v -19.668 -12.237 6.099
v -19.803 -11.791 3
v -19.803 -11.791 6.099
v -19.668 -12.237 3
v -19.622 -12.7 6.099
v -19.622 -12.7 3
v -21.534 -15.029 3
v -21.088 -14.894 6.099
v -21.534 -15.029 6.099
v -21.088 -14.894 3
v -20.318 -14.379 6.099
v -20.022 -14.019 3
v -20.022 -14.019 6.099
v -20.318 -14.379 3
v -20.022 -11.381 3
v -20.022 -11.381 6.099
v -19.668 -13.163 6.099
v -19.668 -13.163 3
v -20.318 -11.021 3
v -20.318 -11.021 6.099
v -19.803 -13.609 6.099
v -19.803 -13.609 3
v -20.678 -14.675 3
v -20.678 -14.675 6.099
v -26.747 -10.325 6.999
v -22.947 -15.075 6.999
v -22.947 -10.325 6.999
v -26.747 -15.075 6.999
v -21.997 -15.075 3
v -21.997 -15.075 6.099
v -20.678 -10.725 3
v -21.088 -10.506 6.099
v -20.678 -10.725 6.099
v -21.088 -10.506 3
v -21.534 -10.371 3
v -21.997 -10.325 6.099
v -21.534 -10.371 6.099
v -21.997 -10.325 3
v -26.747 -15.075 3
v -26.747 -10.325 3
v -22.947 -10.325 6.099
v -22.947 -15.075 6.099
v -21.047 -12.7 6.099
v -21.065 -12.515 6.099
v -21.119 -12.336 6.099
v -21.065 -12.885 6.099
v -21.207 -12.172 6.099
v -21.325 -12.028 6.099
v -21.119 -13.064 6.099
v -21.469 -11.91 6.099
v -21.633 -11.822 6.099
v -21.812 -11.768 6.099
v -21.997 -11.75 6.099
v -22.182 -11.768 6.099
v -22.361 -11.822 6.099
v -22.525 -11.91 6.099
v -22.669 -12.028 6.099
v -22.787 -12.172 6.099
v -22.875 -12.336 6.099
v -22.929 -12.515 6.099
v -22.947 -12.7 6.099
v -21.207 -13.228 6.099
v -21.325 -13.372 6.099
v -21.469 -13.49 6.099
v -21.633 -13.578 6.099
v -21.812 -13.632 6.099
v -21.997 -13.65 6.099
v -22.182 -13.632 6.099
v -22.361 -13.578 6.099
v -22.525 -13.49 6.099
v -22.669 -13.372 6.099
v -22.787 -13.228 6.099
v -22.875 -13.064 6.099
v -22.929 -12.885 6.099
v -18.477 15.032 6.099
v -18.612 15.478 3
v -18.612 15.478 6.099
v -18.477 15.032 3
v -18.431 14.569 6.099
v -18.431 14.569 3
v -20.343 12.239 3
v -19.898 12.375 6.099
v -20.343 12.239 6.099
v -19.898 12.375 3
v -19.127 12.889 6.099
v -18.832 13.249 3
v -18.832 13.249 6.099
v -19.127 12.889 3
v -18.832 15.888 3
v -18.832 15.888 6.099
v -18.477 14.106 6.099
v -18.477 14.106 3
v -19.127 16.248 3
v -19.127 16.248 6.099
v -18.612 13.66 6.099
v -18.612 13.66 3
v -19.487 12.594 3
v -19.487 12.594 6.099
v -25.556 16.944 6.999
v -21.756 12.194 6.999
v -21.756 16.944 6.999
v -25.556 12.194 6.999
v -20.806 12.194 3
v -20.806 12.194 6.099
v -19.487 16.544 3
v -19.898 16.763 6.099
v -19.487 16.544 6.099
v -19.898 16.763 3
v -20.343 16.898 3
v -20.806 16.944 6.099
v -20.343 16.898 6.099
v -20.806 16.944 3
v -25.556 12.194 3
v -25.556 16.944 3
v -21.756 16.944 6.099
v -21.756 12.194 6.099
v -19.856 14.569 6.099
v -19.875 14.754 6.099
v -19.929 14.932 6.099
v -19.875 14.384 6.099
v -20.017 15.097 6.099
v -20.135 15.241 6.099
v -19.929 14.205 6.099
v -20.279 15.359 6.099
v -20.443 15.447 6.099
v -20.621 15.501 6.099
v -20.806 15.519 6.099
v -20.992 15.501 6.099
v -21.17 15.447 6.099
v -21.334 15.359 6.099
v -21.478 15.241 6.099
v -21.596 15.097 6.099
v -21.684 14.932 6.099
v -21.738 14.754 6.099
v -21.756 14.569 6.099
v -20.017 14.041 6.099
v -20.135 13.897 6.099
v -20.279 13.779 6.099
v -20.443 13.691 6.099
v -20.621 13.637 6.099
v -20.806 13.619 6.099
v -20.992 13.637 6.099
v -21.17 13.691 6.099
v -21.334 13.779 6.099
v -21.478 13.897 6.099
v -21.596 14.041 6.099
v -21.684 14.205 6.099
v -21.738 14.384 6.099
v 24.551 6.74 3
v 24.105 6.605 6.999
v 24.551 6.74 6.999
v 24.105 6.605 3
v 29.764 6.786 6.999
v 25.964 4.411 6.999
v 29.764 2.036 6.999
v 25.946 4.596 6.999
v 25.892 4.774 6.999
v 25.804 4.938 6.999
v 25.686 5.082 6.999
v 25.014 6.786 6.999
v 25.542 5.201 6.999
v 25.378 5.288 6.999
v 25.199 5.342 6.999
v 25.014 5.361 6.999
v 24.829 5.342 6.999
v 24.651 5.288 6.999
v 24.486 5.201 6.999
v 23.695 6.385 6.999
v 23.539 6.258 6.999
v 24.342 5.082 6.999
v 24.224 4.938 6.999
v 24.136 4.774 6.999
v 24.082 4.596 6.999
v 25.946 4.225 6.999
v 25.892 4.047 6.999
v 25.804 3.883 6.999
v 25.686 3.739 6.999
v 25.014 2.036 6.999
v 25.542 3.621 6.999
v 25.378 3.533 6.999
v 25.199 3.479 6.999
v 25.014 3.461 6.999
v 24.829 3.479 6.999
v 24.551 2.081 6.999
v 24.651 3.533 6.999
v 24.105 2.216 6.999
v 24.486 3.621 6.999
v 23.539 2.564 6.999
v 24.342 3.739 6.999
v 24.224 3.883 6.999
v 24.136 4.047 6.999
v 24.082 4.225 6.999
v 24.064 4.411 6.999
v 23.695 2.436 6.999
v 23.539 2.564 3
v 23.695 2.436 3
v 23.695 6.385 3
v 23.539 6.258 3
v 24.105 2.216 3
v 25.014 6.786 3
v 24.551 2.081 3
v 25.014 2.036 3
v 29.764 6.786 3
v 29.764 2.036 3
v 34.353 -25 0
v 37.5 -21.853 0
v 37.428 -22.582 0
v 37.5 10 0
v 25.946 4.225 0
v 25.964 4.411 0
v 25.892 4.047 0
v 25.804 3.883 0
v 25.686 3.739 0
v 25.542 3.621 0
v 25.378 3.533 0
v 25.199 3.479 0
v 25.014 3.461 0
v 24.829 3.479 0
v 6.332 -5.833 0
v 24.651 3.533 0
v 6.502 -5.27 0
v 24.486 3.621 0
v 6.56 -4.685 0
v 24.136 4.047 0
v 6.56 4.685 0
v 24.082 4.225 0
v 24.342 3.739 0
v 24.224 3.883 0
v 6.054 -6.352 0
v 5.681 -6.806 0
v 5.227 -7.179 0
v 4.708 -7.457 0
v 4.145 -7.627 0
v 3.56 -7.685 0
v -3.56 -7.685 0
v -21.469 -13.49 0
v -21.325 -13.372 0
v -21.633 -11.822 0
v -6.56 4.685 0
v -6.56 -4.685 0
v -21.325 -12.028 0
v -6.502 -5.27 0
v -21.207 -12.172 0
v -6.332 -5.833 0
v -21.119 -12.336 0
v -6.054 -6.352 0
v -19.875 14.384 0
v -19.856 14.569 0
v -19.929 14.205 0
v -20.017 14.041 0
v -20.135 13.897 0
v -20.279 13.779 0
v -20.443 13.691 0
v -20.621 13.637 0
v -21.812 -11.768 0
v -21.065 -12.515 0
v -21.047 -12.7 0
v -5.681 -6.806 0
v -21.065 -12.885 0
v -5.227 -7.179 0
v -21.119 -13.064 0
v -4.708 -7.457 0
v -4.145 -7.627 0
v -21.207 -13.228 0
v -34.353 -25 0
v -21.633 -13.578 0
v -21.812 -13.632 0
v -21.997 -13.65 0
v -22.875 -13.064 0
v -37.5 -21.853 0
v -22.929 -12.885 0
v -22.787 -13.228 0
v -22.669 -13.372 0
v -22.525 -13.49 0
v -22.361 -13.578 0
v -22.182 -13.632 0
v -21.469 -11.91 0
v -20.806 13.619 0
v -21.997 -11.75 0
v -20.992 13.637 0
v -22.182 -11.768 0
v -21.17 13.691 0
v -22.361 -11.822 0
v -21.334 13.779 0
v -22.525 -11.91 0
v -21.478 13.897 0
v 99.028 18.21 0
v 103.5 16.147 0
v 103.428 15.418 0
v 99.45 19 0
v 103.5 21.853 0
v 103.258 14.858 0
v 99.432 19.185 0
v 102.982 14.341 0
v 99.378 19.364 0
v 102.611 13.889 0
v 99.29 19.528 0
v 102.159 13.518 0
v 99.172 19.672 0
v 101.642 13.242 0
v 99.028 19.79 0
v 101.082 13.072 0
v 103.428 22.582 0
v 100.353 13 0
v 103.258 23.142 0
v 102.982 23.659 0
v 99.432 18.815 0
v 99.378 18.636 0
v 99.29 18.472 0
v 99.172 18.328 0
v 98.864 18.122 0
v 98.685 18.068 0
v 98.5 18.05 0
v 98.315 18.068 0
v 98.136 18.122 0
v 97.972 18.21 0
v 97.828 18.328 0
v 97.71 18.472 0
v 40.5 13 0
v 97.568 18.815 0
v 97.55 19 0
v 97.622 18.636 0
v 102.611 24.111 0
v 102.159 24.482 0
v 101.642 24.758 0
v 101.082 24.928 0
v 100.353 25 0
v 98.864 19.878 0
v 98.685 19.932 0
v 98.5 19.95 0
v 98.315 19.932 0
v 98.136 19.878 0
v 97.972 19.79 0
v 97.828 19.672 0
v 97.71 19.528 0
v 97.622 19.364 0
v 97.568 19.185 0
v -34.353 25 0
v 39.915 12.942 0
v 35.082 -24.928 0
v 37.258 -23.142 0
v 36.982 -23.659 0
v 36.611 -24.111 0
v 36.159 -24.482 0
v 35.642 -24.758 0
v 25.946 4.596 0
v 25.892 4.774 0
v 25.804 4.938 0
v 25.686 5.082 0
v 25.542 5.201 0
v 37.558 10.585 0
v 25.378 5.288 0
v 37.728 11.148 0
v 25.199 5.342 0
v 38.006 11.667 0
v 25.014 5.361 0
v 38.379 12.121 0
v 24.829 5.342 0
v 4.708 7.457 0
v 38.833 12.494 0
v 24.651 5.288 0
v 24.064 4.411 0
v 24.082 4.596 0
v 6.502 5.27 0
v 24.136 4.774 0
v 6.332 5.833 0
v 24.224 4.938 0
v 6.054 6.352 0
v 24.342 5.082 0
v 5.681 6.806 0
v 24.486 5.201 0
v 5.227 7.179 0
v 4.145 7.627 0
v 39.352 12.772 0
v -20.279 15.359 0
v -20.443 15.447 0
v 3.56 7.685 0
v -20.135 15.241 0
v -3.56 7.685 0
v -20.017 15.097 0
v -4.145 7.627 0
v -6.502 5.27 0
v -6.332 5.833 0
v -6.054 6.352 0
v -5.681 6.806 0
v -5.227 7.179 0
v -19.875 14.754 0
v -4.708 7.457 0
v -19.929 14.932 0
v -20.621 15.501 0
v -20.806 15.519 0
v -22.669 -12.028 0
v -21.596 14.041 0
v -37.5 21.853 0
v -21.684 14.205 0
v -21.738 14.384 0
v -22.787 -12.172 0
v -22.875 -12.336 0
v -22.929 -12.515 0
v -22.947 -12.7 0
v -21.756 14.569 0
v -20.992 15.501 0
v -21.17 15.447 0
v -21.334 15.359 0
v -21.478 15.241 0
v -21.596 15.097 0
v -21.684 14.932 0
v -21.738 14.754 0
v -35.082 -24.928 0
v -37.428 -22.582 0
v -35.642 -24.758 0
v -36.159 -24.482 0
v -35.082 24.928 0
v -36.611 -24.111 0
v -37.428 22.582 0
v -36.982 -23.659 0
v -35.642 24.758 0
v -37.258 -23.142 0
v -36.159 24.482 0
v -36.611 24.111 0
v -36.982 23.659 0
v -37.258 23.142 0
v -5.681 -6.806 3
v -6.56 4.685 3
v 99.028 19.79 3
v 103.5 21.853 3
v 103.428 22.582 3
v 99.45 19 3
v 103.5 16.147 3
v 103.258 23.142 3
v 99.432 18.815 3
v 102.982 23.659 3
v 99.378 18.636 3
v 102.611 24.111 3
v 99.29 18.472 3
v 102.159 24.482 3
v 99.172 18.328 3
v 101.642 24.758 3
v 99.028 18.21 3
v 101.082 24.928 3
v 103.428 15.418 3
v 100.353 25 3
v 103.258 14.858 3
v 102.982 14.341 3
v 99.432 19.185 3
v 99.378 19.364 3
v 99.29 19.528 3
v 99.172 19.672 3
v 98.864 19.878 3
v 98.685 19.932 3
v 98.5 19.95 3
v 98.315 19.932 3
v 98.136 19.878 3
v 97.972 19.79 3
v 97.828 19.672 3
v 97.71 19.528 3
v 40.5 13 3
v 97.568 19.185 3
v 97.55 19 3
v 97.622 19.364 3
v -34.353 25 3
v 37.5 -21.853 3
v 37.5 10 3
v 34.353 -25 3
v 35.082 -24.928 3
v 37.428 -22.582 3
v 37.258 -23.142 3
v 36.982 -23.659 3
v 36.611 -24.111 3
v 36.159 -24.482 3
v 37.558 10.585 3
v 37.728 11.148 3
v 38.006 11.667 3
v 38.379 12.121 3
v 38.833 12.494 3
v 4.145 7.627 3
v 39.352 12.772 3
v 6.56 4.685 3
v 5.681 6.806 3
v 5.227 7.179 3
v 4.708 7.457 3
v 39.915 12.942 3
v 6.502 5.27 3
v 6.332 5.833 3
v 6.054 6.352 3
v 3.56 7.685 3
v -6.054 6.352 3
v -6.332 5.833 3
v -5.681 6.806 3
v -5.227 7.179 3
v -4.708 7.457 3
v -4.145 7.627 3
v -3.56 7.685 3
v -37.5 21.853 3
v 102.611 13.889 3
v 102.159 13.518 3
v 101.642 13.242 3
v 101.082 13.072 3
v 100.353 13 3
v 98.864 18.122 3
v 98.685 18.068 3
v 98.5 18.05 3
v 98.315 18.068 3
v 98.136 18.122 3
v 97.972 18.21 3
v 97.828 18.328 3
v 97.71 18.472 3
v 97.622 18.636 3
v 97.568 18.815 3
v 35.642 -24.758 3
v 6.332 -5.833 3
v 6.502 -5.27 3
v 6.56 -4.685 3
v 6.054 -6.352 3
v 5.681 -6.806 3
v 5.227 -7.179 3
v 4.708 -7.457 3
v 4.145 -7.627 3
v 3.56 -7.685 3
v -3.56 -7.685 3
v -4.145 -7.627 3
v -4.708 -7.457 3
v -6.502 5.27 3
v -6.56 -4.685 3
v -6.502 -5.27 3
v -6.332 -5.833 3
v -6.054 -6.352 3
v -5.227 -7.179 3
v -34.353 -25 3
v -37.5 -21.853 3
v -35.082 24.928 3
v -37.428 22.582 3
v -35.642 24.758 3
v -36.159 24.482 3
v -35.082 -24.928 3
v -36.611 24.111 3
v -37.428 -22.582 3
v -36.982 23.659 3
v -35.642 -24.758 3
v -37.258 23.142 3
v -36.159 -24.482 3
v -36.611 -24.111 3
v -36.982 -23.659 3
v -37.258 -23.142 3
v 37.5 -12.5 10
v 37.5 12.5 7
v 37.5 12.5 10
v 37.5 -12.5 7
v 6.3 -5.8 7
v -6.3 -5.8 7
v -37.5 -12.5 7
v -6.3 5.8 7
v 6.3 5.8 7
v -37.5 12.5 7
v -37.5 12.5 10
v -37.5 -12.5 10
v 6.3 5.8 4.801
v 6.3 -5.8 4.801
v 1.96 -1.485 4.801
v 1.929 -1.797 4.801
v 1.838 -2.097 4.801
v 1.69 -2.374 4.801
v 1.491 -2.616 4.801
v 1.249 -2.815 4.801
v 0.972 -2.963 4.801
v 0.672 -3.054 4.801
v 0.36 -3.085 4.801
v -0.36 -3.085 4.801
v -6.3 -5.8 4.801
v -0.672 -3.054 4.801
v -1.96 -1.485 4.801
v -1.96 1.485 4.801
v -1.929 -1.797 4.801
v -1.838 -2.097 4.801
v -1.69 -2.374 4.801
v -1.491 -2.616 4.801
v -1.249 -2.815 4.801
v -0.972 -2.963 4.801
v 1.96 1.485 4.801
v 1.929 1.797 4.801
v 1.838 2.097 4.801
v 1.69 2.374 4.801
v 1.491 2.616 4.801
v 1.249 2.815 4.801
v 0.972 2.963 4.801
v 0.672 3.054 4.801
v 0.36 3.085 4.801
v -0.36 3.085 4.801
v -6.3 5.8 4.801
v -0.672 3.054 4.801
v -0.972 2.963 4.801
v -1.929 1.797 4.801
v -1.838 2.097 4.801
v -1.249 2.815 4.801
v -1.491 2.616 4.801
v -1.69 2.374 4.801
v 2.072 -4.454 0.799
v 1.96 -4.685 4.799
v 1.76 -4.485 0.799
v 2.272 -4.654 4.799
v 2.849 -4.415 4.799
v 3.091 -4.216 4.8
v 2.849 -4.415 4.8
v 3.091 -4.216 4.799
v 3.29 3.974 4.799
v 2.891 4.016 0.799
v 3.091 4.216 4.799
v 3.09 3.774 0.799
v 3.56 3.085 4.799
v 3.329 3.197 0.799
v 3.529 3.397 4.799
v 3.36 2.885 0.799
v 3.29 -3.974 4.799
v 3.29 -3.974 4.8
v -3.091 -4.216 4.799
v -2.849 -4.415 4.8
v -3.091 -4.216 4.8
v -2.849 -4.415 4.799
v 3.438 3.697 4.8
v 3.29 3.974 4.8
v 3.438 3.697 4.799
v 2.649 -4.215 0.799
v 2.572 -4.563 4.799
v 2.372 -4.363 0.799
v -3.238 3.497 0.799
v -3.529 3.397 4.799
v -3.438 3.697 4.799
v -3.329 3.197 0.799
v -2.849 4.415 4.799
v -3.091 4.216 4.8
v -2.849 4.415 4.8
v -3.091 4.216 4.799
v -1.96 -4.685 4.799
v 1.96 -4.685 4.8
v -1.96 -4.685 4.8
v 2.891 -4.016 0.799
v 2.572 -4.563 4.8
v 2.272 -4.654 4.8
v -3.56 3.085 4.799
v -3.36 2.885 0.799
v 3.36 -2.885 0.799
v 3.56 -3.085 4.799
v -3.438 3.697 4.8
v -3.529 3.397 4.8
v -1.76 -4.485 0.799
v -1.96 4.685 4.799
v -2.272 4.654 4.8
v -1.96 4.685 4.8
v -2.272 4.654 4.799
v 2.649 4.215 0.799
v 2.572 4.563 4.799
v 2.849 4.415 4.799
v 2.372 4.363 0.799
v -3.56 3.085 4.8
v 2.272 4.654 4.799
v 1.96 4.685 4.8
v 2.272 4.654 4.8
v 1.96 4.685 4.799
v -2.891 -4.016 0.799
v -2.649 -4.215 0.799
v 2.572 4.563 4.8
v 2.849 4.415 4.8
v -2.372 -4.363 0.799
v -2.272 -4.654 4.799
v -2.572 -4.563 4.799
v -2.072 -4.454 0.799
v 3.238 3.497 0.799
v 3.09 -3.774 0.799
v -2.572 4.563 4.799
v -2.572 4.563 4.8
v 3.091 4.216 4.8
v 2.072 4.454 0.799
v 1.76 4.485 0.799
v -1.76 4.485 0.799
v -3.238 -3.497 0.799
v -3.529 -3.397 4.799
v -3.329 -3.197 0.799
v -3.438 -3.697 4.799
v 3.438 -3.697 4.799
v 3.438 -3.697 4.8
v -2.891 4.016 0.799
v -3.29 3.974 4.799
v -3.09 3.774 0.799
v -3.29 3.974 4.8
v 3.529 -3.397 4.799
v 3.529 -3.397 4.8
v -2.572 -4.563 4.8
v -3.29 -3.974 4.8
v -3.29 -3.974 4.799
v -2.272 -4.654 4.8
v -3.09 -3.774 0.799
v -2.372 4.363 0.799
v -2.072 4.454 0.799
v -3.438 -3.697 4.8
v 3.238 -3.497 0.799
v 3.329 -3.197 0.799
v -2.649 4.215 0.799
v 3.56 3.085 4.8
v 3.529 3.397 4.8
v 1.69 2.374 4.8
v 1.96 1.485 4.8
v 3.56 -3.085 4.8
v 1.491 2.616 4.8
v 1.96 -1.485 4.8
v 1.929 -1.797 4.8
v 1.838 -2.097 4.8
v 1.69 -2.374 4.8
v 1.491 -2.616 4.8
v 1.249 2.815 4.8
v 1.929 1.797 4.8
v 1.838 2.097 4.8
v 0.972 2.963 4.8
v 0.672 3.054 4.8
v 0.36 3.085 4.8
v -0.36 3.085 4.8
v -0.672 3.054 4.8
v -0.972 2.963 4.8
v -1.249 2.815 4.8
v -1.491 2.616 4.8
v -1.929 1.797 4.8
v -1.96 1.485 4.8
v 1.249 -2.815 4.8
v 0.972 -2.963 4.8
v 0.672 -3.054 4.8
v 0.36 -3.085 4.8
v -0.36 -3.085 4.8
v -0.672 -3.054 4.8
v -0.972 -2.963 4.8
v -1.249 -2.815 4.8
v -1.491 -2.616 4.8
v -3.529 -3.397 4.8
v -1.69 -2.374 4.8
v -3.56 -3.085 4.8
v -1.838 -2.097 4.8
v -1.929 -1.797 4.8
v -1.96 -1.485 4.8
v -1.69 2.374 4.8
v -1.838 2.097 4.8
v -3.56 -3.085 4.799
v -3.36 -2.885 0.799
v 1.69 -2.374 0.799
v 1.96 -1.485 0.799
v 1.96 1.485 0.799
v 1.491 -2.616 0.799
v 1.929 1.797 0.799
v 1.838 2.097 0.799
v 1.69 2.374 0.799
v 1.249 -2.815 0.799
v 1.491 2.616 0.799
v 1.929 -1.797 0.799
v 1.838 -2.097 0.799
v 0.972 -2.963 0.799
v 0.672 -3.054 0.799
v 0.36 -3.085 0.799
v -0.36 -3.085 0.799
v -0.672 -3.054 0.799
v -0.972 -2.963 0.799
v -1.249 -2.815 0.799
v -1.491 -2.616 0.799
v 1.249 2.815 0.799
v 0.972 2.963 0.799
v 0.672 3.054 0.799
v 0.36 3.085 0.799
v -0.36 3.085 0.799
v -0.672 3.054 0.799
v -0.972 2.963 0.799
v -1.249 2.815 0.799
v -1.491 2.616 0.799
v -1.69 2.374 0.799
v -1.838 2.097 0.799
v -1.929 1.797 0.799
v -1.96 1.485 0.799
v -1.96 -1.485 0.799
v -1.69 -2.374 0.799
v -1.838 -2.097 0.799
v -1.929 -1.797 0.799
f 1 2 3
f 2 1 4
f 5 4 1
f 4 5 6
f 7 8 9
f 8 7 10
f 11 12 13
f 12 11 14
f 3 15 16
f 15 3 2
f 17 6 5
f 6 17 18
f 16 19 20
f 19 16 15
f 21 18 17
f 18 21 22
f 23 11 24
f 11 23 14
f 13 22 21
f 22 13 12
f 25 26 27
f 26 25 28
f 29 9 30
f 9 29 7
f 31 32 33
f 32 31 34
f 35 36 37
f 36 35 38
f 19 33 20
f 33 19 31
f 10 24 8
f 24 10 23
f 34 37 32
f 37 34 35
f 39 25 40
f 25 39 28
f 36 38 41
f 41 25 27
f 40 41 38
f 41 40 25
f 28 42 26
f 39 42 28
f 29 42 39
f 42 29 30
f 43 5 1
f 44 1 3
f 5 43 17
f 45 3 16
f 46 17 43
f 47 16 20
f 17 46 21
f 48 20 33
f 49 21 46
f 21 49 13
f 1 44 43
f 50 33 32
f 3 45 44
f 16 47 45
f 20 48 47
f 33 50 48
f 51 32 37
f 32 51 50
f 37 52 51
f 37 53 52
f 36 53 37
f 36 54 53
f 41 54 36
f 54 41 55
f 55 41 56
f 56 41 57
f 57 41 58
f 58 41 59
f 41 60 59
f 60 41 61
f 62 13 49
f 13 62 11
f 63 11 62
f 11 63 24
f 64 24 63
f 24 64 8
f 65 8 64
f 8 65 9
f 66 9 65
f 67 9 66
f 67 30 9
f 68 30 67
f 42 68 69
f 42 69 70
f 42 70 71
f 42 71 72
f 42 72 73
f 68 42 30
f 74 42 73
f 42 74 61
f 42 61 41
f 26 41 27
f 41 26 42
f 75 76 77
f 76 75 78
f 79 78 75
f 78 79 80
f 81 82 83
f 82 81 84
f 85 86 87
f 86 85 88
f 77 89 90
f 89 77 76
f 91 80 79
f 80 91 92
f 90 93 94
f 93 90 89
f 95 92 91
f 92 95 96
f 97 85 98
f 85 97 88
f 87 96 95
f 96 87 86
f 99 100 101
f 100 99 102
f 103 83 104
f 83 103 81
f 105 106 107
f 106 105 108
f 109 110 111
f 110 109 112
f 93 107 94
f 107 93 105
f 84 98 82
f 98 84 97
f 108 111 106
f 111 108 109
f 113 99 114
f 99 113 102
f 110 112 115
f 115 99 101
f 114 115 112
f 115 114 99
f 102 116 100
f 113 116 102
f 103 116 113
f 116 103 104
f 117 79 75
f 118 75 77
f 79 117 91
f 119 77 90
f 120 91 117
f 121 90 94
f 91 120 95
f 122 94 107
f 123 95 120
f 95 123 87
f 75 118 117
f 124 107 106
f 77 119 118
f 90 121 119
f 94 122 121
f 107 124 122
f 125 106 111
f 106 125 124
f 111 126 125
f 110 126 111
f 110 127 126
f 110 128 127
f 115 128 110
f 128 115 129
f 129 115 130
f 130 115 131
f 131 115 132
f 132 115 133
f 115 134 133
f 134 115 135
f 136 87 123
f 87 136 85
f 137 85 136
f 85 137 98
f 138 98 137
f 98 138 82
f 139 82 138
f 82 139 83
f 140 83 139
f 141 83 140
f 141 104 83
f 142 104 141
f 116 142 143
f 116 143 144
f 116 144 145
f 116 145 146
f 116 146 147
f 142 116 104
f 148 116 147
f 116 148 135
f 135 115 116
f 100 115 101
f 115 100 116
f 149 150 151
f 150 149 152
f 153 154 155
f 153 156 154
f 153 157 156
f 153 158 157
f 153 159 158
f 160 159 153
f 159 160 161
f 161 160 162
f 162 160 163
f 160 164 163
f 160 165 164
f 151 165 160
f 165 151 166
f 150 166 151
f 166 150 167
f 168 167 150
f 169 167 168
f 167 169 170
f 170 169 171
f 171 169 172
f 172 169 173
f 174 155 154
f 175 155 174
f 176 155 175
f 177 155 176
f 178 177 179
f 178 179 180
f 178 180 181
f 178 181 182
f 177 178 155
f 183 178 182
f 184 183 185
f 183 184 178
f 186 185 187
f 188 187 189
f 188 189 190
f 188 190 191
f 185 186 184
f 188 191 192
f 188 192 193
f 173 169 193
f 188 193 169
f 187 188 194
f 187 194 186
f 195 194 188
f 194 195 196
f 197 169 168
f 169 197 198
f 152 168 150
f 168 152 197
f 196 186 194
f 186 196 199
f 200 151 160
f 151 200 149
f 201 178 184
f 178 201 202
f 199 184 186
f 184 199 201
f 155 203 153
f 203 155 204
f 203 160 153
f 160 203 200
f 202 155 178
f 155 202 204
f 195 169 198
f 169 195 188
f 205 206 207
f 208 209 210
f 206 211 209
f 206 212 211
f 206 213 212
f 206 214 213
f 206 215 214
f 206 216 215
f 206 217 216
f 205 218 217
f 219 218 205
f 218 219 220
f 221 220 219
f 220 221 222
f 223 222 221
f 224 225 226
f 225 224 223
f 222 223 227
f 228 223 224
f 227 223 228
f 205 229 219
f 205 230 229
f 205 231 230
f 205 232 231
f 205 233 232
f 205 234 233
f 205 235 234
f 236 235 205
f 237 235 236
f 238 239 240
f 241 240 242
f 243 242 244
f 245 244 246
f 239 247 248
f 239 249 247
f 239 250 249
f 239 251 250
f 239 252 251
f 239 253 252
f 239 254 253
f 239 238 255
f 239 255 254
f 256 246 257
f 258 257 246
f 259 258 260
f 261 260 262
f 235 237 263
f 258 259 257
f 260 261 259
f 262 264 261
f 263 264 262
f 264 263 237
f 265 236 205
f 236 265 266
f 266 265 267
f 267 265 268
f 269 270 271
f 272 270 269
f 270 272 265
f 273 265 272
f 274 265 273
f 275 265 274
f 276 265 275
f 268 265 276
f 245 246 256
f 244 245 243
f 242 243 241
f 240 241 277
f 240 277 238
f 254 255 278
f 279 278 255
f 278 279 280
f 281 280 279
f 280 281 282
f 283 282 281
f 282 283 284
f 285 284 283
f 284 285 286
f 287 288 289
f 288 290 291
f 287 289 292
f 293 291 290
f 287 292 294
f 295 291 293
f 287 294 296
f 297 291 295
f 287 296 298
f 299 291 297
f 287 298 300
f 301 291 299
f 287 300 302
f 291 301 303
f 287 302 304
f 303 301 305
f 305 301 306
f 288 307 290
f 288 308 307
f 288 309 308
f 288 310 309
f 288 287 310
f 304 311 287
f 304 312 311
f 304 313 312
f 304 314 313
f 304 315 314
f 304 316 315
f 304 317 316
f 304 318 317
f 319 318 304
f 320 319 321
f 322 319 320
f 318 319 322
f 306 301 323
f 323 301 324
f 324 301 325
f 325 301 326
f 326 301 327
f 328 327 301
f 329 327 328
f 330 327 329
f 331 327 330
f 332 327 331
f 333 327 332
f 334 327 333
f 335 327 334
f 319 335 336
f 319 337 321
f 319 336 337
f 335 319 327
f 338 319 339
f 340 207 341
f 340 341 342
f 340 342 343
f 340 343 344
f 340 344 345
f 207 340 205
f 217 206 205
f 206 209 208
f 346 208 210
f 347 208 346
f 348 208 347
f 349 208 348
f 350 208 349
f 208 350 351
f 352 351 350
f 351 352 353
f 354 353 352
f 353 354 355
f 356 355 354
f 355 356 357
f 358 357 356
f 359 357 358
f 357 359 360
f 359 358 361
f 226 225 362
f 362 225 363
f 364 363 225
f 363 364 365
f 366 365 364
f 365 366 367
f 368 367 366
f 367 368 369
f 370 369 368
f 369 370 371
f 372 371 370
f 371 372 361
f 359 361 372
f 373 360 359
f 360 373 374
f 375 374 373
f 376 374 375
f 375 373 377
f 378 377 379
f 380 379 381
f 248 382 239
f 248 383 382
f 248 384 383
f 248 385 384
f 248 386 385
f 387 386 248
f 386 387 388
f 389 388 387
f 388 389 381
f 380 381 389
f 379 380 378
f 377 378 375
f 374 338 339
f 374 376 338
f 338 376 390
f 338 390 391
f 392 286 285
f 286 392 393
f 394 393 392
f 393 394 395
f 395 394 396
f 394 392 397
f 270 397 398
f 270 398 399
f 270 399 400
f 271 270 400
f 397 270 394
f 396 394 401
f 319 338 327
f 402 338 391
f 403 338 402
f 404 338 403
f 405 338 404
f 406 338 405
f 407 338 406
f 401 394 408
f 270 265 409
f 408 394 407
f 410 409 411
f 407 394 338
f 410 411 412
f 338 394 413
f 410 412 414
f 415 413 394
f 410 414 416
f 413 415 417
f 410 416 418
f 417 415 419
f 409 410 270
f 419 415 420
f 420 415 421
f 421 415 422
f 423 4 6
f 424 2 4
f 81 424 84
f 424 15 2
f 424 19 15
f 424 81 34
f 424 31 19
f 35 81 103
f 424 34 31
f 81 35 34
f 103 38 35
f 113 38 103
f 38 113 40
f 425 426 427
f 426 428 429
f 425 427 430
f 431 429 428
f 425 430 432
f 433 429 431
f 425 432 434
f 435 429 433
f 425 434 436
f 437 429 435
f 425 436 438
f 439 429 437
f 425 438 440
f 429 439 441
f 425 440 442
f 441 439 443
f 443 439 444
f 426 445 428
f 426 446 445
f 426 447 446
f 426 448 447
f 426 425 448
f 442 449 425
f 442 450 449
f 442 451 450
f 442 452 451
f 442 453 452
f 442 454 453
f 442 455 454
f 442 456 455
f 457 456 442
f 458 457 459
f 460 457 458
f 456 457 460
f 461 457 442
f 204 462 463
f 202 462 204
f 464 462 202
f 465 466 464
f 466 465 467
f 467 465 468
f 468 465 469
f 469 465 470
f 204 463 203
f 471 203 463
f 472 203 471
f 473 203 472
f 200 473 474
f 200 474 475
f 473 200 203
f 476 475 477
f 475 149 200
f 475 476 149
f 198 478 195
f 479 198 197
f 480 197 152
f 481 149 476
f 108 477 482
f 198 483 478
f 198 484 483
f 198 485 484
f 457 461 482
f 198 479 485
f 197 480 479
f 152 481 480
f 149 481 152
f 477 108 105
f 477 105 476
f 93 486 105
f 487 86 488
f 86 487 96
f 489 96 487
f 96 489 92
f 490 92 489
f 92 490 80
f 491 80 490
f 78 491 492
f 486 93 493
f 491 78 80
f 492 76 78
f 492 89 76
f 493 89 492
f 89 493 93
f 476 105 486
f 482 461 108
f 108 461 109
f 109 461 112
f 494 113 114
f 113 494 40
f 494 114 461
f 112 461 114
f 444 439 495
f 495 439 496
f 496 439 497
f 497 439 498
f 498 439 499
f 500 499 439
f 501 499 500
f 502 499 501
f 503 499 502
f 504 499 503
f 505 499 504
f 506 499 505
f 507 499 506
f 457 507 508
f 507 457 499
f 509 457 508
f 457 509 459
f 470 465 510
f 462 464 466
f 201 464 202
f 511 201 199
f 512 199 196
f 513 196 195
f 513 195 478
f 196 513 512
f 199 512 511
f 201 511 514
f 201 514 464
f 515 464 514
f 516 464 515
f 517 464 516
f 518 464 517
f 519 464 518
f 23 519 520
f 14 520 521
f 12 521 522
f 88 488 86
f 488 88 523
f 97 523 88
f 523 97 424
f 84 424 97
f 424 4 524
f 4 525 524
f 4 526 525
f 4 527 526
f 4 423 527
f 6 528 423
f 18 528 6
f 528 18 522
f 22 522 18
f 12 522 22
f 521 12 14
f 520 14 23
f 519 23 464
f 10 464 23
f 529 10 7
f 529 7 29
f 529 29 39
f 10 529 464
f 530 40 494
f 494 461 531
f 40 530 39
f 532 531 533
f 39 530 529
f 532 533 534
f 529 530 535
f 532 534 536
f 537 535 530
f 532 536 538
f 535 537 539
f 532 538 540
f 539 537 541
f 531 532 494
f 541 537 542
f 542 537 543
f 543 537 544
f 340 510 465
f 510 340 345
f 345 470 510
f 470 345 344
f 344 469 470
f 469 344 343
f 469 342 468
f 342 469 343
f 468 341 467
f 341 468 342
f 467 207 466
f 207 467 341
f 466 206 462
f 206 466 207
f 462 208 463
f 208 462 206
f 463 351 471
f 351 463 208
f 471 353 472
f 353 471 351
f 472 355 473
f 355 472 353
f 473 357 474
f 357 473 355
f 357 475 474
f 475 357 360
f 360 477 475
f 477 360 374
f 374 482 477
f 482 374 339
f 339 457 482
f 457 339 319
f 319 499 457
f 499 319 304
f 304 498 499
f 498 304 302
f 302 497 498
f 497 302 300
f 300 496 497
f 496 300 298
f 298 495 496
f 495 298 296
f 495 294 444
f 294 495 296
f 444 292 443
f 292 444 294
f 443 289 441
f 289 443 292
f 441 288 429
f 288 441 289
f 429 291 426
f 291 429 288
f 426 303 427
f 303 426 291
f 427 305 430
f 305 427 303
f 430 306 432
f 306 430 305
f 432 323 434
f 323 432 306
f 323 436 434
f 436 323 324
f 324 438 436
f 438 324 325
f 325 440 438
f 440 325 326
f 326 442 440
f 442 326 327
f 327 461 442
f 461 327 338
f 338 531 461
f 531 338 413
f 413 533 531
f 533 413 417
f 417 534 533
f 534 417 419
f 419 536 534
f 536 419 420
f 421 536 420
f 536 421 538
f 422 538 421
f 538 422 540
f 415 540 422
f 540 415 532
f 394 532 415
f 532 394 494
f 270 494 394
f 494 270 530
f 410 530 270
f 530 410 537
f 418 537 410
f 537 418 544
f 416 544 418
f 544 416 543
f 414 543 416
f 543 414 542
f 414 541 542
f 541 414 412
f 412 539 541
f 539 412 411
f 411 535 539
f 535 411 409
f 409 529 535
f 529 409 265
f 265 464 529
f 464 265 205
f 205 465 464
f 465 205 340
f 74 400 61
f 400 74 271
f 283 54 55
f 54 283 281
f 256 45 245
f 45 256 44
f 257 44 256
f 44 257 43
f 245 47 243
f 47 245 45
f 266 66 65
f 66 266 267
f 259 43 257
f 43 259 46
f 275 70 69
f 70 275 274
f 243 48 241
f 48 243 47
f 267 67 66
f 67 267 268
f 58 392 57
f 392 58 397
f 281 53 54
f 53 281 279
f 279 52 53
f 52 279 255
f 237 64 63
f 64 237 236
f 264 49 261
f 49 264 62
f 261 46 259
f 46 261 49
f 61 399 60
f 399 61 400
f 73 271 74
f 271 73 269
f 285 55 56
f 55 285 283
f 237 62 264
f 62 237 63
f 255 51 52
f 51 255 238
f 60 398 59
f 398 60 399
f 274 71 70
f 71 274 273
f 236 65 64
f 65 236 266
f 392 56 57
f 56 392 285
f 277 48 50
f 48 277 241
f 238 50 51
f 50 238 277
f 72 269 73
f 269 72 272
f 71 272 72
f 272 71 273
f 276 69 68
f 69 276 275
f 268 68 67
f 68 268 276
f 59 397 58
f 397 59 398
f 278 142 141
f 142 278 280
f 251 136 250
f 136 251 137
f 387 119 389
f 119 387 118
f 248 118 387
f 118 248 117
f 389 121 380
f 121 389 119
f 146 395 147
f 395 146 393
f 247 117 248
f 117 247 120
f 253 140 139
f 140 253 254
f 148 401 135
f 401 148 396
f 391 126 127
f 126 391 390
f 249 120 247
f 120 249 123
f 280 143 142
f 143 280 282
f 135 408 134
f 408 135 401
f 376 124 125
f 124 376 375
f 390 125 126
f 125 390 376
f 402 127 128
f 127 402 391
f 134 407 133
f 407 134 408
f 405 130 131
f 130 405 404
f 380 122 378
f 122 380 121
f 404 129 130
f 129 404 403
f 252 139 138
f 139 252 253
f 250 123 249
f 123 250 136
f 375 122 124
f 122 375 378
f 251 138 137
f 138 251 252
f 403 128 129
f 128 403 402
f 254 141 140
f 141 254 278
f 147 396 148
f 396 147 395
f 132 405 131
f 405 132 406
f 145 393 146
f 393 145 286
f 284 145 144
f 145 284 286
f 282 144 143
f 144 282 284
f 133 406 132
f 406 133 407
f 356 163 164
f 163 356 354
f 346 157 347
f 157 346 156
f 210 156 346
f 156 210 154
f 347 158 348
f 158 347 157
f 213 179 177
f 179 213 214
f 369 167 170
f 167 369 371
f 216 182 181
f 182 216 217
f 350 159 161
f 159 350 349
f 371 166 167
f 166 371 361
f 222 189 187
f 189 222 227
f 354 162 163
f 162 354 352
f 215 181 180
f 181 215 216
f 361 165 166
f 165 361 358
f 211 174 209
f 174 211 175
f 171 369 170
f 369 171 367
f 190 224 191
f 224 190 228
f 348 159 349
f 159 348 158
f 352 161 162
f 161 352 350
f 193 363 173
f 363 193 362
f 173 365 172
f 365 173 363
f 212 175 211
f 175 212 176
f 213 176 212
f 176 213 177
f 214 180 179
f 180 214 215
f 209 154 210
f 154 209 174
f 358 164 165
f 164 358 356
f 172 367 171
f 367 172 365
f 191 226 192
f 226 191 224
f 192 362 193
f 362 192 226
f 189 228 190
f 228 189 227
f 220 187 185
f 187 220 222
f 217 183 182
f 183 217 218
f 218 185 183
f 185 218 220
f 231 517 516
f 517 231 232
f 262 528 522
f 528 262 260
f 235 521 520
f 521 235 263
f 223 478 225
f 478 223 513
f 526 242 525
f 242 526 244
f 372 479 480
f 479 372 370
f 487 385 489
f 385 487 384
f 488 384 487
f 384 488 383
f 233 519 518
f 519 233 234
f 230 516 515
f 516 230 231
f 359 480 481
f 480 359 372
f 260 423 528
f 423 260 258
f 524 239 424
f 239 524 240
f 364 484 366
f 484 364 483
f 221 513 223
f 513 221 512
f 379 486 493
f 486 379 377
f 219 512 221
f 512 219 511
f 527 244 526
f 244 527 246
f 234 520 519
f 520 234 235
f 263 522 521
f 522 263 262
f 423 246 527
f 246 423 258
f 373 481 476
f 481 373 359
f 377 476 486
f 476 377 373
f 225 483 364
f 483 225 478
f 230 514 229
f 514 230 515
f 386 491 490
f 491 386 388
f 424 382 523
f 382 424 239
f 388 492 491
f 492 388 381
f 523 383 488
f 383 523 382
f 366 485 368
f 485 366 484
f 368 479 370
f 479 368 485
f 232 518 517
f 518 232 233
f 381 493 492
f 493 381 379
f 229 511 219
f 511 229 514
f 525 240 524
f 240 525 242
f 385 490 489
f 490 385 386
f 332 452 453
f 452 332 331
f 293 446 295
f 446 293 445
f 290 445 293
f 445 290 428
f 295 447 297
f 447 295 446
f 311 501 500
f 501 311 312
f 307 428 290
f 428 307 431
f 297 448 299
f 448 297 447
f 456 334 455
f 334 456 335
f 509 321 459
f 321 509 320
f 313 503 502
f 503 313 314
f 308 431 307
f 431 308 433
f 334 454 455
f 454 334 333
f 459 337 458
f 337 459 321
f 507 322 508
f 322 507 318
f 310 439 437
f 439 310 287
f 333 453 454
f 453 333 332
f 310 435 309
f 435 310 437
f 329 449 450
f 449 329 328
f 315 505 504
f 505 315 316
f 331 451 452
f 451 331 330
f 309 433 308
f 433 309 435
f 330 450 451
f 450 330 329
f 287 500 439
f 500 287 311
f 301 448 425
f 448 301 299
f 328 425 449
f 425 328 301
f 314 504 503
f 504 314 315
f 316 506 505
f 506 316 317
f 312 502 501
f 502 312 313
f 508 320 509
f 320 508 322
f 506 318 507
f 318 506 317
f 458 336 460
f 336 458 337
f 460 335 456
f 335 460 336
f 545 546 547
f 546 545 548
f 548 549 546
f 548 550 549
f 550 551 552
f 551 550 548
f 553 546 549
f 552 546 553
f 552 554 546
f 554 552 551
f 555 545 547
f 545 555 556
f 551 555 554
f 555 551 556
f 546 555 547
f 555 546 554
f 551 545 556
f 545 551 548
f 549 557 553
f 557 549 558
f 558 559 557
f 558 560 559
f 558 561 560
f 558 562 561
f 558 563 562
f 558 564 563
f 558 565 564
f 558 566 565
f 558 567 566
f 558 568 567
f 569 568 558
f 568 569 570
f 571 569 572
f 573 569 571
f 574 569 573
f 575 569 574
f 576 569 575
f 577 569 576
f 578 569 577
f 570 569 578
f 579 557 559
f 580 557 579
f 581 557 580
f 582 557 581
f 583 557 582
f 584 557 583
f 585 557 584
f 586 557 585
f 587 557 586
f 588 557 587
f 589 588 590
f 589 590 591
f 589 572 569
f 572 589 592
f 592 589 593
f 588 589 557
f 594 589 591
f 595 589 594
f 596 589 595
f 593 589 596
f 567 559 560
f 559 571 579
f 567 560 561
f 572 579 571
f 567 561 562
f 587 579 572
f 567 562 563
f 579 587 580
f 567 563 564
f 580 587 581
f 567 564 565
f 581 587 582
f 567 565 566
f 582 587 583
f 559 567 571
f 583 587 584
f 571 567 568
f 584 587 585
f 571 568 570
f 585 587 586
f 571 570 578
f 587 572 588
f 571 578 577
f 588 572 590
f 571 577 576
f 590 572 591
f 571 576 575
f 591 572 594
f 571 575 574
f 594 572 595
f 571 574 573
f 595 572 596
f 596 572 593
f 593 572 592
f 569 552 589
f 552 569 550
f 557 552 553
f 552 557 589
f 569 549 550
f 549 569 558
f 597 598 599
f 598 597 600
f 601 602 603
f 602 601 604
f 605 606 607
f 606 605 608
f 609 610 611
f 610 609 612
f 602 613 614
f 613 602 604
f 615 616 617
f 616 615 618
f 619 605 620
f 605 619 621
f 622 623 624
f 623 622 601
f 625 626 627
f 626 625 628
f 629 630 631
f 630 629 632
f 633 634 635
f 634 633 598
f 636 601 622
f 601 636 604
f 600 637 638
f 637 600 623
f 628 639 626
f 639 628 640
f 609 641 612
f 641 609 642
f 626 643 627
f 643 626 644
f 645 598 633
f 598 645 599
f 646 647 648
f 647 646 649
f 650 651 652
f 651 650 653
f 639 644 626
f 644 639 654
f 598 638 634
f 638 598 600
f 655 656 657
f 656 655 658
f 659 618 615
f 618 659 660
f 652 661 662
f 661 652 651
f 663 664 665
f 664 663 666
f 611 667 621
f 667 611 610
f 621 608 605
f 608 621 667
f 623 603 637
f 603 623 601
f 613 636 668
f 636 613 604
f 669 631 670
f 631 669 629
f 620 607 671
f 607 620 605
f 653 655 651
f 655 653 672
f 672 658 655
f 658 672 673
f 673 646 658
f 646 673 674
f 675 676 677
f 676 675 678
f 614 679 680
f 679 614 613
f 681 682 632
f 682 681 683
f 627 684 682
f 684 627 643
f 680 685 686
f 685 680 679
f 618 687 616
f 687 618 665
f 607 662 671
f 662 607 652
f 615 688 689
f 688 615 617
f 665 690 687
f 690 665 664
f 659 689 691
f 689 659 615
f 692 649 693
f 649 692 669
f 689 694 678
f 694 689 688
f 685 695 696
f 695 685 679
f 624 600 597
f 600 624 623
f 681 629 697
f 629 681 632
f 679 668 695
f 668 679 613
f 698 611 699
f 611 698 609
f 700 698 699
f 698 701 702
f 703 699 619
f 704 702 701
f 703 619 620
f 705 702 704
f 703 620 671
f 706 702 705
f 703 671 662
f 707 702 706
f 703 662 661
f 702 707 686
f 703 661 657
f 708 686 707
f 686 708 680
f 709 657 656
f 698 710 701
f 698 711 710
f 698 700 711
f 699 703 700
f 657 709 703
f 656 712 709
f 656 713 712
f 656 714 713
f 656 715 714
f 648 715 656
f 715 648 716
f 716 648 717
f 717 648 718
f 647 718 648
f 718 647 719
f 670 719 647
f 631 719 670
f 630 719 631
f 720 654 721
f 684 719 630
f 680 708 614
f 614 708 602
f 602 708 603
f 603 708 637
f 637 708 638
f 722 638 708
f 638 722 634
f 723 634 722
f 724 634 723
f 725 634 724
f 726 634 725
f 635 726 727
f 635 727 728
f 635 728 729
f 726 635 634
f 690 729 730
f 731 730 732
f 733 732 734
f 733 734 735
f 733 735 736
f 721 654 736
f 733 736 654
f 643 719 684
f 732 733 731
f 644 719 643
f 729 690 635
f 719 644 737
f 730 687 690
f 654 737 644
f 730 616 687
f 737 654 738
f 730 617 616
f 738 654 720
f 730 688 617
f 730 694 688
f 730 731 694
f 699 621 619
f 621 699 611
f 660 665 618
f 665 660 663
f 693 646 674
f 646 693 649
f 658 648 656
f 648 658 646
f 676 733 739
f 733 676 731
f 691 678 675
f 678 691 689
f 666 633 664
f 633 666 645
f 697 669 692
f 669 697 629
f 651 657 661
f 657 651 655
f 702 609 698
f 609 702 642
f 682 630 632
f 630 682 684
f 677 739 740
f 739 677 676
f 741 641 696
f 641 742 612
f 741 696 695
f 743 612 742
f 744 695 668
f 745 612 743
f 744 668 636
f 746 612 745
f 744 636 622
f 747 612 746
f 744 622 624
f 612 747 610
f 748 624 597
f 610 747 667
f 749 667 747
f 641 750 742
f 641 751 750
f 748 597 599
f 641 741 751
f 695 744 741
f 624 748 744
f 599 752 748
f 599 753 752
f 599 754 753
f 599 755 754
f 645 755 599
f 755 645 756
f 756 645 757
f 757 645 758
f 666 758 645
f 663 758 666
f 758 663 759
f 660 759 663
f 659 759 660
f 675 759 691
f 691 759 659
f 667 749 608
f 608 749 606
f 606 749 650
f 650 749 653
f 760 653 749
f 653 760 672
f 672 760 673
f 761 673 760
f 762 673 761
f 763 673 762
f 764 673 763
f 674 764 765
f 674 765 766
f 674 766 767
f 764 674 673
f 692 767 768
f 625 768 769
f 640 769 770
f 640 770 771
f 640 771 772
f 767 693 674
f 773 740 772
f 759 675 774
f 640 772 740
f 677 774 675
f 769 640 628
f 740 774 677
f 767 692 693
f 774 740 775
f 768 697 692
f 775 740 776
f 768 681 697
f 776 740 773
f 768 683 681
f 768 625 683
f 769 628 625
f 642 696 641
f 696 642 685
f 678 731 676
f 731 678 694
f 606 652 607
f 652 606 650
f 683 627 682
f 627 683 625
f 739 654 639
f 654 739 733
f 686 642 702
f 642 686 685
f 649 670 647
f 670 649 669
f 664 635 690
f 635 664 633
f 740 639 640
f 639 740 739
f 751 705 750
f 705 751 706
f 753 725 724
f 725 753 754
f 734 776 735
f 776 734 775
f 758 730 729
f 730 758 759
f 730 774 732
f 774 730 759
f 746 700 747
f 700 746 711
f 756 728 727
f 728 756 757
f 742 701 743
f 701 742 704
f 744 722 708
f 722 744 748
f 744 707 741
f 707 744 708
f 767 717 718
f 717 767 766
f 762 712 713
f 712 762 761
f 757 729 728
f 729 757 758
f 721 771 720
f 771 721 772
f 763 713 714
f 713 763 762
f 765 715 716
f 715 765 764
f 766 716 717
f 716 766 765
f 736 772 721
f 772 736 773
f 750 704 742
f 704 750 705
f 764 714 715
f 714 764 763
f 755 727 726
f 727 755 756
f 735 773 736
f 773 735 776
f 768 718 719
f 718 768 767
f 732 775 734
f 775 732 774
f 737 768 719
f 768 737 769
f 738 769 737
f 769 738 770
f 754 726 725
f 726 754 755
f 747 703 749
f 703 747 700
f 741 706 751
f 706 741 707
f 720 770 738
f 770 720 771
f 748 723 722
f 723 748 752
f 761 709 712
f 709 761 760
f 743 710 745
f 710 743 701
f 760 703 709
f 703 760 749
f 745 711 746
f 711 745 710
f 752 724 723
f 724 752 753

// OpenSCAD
$fn = $preview?16:32;
eps1 = 0.001;
eps2 = 2*eps1;
nozzle = 0.4;

plate_x = 75.0;
plate_y = 50.0;

// pillars for screws
d1 = 1.9;  // inner diameter pillar
d2 = 4.75; // outer diameter pillar
// screws
dscrew = 25.4;
alpha1 = 90+120;
alpha2 = 90+55;
alpha3 = 90-80;
// screw 1
x1 = dscrew * cos(alpha1);
y1 = dscrew * sin(alpha1);
t1 = (d2-d1)/2; // bump on pillar
cut1 = 0.9;     // bump on pillar
// screw 2
x2 = dscrew * cos(alpha2);
y2 = dscrew * sin(alpha2);
t2 = (d2-d1)/2; // bump on pillar
cut2 = 0.9;     // bump on pillar
// screw 3
x3 = dscrew * cos(alpha3);
y3 = dscrew * sin(alpha3);
t3 = -d2+0.9;   // cut on pillar
cut3 = 4.0;     // cut on pillar

// central hole size
l1 = 7.12;
l2 = 9.37;

h1 = 3.0;
h2 = 4.0;

dmax = 3.0;

// support for attaching arduino nano
pcb_support = true;

pcb_x = 66.0;
pcb_y = 12.0;
pcbscrew_x = pcb_x - 5.0;
pcbscrew_d = 2.0;

module stageplate() {
    difference() {
        stageplate_body();
        stageplate_holes();
    }
}

module stageplate_body() {
    translate([-plate_x/2, -plate_y/2, 0])
    linear_extrude(h1)
    offset(-dmax)
    offset(2*dmax)
    offset(-dmax)
    union() {
        square([plate_x, plate_y]);
        if (pcb_support)
        translate([plate_x, plate_y-pcb_y, 0])
        square([pcb_x, pcb_y]);
    }

    // screws
    translate([x1, y1, h1-eps1])
    difference() {
        union() {
            cylinder(h=h2, d=d2);
            translate([-d2, -d2/2, 0])
            cube([d2, d2, h2]);
        }
        translate([t1-d2/2, -d2, h2-cut1])
        cube([d2, 2*d2, h2]);
    }
    translate([x2, y2, h1-eps1])
    difference() {
        union() {
            cylinder(h=h2, d=d2);
            translate([-d2, -d2/2, 0])
            cube([d2, d2, h2]);
        }
        translate([t2-d2/2, -d2, h2-cut2])
        cube([d2, 2*d2, h2]);
    }
    translate([x3, y3, h1-eps1])
    difference() {
        union() {
            cylinder(h=h2, d=d2);
            translate([0, -d2/2, 0])
            cube([d2, d2, h2]);
        }
        translate([t3-d2/2, -d2/2, h2-cut3])
        cube([d2, d2, h2+eps1]);
    }
}

module stageplate_holes() {
    h = h1+h2+eps2;
    translate([x1, y1, -eps1])
    cylinder(h=h, d=d1);
    translate([x2, y2, -eps1])
    cylinder(h=h, d=d1);
    translate([x3, y3, -eps1])
    cylinder(h=h, d=d1);
    translate([-l1/2, -l2/2, -eps1])
    linear_extrude(h)
    offset(dmax)
    square([l1, l2]);
    // pcb
    if (pcb_support)
    translate([plate_x/2 + pcbscrew_x, plate_y/2-pcb_y/2, -eps1])
    cylinder(h=h, d=d1);
}


stage_x = 75.0;
stage_y = 25.0;
stage_z = 3.0;
foot_x = 13.0 - nozzle;
foot_y = 12.0 - nozzle;
foot_z = 2.2;
chamfer = 1.6;
wall_thickness = 1.6;
module stage(no_hole) {
    difference() {
        stage_body();
        stage_holes(no_hole); // no_hole = true or false
    }
}

module stage_body() {
    translate([-stage_x/2, -stage_y/2, 0])
    cube([stage_x, stage_y, stage_z]);
    translate([-foot_x/2, -foot_y/2, stage_z-eps1])
    cube([foot_x, foot_y, foot_z]);

    hull() {
        translate([0, 0, h1+foot_z+4])
        linear_extrude(eps1)
        offset(chamfer)
        offset(-chamfer)
        square([l1-nozzle, l2-nozzle], center = true);
        translate([0, 0, h1+foot_z])
        linear_extrude(eps1)
        offset(chamfer)
        offset(-chamfer)
        square([l1, l2], center = true);
    }
}

module stage_holes(solid = true) {
    translate([0, 0, solid ? -h1-foot_z-eps1 : 0])
    translate([-l1/2, -l2/2, h1+foot_z-eps1])
    linear_extrude(h1*10)
    offset(wall_thickness)
    offset(-2*wall_thickness)
    square([l1, l2]);
}

module assembly() {
    stageplate();
    translate([0, 0, 10])
    mirror([0,0,1])
    stage(false); // no hole in stage
}

assembly();
//projection()
//stageplate();
//stage(false); // no hole in stage
//stage(true); // hole in stage
